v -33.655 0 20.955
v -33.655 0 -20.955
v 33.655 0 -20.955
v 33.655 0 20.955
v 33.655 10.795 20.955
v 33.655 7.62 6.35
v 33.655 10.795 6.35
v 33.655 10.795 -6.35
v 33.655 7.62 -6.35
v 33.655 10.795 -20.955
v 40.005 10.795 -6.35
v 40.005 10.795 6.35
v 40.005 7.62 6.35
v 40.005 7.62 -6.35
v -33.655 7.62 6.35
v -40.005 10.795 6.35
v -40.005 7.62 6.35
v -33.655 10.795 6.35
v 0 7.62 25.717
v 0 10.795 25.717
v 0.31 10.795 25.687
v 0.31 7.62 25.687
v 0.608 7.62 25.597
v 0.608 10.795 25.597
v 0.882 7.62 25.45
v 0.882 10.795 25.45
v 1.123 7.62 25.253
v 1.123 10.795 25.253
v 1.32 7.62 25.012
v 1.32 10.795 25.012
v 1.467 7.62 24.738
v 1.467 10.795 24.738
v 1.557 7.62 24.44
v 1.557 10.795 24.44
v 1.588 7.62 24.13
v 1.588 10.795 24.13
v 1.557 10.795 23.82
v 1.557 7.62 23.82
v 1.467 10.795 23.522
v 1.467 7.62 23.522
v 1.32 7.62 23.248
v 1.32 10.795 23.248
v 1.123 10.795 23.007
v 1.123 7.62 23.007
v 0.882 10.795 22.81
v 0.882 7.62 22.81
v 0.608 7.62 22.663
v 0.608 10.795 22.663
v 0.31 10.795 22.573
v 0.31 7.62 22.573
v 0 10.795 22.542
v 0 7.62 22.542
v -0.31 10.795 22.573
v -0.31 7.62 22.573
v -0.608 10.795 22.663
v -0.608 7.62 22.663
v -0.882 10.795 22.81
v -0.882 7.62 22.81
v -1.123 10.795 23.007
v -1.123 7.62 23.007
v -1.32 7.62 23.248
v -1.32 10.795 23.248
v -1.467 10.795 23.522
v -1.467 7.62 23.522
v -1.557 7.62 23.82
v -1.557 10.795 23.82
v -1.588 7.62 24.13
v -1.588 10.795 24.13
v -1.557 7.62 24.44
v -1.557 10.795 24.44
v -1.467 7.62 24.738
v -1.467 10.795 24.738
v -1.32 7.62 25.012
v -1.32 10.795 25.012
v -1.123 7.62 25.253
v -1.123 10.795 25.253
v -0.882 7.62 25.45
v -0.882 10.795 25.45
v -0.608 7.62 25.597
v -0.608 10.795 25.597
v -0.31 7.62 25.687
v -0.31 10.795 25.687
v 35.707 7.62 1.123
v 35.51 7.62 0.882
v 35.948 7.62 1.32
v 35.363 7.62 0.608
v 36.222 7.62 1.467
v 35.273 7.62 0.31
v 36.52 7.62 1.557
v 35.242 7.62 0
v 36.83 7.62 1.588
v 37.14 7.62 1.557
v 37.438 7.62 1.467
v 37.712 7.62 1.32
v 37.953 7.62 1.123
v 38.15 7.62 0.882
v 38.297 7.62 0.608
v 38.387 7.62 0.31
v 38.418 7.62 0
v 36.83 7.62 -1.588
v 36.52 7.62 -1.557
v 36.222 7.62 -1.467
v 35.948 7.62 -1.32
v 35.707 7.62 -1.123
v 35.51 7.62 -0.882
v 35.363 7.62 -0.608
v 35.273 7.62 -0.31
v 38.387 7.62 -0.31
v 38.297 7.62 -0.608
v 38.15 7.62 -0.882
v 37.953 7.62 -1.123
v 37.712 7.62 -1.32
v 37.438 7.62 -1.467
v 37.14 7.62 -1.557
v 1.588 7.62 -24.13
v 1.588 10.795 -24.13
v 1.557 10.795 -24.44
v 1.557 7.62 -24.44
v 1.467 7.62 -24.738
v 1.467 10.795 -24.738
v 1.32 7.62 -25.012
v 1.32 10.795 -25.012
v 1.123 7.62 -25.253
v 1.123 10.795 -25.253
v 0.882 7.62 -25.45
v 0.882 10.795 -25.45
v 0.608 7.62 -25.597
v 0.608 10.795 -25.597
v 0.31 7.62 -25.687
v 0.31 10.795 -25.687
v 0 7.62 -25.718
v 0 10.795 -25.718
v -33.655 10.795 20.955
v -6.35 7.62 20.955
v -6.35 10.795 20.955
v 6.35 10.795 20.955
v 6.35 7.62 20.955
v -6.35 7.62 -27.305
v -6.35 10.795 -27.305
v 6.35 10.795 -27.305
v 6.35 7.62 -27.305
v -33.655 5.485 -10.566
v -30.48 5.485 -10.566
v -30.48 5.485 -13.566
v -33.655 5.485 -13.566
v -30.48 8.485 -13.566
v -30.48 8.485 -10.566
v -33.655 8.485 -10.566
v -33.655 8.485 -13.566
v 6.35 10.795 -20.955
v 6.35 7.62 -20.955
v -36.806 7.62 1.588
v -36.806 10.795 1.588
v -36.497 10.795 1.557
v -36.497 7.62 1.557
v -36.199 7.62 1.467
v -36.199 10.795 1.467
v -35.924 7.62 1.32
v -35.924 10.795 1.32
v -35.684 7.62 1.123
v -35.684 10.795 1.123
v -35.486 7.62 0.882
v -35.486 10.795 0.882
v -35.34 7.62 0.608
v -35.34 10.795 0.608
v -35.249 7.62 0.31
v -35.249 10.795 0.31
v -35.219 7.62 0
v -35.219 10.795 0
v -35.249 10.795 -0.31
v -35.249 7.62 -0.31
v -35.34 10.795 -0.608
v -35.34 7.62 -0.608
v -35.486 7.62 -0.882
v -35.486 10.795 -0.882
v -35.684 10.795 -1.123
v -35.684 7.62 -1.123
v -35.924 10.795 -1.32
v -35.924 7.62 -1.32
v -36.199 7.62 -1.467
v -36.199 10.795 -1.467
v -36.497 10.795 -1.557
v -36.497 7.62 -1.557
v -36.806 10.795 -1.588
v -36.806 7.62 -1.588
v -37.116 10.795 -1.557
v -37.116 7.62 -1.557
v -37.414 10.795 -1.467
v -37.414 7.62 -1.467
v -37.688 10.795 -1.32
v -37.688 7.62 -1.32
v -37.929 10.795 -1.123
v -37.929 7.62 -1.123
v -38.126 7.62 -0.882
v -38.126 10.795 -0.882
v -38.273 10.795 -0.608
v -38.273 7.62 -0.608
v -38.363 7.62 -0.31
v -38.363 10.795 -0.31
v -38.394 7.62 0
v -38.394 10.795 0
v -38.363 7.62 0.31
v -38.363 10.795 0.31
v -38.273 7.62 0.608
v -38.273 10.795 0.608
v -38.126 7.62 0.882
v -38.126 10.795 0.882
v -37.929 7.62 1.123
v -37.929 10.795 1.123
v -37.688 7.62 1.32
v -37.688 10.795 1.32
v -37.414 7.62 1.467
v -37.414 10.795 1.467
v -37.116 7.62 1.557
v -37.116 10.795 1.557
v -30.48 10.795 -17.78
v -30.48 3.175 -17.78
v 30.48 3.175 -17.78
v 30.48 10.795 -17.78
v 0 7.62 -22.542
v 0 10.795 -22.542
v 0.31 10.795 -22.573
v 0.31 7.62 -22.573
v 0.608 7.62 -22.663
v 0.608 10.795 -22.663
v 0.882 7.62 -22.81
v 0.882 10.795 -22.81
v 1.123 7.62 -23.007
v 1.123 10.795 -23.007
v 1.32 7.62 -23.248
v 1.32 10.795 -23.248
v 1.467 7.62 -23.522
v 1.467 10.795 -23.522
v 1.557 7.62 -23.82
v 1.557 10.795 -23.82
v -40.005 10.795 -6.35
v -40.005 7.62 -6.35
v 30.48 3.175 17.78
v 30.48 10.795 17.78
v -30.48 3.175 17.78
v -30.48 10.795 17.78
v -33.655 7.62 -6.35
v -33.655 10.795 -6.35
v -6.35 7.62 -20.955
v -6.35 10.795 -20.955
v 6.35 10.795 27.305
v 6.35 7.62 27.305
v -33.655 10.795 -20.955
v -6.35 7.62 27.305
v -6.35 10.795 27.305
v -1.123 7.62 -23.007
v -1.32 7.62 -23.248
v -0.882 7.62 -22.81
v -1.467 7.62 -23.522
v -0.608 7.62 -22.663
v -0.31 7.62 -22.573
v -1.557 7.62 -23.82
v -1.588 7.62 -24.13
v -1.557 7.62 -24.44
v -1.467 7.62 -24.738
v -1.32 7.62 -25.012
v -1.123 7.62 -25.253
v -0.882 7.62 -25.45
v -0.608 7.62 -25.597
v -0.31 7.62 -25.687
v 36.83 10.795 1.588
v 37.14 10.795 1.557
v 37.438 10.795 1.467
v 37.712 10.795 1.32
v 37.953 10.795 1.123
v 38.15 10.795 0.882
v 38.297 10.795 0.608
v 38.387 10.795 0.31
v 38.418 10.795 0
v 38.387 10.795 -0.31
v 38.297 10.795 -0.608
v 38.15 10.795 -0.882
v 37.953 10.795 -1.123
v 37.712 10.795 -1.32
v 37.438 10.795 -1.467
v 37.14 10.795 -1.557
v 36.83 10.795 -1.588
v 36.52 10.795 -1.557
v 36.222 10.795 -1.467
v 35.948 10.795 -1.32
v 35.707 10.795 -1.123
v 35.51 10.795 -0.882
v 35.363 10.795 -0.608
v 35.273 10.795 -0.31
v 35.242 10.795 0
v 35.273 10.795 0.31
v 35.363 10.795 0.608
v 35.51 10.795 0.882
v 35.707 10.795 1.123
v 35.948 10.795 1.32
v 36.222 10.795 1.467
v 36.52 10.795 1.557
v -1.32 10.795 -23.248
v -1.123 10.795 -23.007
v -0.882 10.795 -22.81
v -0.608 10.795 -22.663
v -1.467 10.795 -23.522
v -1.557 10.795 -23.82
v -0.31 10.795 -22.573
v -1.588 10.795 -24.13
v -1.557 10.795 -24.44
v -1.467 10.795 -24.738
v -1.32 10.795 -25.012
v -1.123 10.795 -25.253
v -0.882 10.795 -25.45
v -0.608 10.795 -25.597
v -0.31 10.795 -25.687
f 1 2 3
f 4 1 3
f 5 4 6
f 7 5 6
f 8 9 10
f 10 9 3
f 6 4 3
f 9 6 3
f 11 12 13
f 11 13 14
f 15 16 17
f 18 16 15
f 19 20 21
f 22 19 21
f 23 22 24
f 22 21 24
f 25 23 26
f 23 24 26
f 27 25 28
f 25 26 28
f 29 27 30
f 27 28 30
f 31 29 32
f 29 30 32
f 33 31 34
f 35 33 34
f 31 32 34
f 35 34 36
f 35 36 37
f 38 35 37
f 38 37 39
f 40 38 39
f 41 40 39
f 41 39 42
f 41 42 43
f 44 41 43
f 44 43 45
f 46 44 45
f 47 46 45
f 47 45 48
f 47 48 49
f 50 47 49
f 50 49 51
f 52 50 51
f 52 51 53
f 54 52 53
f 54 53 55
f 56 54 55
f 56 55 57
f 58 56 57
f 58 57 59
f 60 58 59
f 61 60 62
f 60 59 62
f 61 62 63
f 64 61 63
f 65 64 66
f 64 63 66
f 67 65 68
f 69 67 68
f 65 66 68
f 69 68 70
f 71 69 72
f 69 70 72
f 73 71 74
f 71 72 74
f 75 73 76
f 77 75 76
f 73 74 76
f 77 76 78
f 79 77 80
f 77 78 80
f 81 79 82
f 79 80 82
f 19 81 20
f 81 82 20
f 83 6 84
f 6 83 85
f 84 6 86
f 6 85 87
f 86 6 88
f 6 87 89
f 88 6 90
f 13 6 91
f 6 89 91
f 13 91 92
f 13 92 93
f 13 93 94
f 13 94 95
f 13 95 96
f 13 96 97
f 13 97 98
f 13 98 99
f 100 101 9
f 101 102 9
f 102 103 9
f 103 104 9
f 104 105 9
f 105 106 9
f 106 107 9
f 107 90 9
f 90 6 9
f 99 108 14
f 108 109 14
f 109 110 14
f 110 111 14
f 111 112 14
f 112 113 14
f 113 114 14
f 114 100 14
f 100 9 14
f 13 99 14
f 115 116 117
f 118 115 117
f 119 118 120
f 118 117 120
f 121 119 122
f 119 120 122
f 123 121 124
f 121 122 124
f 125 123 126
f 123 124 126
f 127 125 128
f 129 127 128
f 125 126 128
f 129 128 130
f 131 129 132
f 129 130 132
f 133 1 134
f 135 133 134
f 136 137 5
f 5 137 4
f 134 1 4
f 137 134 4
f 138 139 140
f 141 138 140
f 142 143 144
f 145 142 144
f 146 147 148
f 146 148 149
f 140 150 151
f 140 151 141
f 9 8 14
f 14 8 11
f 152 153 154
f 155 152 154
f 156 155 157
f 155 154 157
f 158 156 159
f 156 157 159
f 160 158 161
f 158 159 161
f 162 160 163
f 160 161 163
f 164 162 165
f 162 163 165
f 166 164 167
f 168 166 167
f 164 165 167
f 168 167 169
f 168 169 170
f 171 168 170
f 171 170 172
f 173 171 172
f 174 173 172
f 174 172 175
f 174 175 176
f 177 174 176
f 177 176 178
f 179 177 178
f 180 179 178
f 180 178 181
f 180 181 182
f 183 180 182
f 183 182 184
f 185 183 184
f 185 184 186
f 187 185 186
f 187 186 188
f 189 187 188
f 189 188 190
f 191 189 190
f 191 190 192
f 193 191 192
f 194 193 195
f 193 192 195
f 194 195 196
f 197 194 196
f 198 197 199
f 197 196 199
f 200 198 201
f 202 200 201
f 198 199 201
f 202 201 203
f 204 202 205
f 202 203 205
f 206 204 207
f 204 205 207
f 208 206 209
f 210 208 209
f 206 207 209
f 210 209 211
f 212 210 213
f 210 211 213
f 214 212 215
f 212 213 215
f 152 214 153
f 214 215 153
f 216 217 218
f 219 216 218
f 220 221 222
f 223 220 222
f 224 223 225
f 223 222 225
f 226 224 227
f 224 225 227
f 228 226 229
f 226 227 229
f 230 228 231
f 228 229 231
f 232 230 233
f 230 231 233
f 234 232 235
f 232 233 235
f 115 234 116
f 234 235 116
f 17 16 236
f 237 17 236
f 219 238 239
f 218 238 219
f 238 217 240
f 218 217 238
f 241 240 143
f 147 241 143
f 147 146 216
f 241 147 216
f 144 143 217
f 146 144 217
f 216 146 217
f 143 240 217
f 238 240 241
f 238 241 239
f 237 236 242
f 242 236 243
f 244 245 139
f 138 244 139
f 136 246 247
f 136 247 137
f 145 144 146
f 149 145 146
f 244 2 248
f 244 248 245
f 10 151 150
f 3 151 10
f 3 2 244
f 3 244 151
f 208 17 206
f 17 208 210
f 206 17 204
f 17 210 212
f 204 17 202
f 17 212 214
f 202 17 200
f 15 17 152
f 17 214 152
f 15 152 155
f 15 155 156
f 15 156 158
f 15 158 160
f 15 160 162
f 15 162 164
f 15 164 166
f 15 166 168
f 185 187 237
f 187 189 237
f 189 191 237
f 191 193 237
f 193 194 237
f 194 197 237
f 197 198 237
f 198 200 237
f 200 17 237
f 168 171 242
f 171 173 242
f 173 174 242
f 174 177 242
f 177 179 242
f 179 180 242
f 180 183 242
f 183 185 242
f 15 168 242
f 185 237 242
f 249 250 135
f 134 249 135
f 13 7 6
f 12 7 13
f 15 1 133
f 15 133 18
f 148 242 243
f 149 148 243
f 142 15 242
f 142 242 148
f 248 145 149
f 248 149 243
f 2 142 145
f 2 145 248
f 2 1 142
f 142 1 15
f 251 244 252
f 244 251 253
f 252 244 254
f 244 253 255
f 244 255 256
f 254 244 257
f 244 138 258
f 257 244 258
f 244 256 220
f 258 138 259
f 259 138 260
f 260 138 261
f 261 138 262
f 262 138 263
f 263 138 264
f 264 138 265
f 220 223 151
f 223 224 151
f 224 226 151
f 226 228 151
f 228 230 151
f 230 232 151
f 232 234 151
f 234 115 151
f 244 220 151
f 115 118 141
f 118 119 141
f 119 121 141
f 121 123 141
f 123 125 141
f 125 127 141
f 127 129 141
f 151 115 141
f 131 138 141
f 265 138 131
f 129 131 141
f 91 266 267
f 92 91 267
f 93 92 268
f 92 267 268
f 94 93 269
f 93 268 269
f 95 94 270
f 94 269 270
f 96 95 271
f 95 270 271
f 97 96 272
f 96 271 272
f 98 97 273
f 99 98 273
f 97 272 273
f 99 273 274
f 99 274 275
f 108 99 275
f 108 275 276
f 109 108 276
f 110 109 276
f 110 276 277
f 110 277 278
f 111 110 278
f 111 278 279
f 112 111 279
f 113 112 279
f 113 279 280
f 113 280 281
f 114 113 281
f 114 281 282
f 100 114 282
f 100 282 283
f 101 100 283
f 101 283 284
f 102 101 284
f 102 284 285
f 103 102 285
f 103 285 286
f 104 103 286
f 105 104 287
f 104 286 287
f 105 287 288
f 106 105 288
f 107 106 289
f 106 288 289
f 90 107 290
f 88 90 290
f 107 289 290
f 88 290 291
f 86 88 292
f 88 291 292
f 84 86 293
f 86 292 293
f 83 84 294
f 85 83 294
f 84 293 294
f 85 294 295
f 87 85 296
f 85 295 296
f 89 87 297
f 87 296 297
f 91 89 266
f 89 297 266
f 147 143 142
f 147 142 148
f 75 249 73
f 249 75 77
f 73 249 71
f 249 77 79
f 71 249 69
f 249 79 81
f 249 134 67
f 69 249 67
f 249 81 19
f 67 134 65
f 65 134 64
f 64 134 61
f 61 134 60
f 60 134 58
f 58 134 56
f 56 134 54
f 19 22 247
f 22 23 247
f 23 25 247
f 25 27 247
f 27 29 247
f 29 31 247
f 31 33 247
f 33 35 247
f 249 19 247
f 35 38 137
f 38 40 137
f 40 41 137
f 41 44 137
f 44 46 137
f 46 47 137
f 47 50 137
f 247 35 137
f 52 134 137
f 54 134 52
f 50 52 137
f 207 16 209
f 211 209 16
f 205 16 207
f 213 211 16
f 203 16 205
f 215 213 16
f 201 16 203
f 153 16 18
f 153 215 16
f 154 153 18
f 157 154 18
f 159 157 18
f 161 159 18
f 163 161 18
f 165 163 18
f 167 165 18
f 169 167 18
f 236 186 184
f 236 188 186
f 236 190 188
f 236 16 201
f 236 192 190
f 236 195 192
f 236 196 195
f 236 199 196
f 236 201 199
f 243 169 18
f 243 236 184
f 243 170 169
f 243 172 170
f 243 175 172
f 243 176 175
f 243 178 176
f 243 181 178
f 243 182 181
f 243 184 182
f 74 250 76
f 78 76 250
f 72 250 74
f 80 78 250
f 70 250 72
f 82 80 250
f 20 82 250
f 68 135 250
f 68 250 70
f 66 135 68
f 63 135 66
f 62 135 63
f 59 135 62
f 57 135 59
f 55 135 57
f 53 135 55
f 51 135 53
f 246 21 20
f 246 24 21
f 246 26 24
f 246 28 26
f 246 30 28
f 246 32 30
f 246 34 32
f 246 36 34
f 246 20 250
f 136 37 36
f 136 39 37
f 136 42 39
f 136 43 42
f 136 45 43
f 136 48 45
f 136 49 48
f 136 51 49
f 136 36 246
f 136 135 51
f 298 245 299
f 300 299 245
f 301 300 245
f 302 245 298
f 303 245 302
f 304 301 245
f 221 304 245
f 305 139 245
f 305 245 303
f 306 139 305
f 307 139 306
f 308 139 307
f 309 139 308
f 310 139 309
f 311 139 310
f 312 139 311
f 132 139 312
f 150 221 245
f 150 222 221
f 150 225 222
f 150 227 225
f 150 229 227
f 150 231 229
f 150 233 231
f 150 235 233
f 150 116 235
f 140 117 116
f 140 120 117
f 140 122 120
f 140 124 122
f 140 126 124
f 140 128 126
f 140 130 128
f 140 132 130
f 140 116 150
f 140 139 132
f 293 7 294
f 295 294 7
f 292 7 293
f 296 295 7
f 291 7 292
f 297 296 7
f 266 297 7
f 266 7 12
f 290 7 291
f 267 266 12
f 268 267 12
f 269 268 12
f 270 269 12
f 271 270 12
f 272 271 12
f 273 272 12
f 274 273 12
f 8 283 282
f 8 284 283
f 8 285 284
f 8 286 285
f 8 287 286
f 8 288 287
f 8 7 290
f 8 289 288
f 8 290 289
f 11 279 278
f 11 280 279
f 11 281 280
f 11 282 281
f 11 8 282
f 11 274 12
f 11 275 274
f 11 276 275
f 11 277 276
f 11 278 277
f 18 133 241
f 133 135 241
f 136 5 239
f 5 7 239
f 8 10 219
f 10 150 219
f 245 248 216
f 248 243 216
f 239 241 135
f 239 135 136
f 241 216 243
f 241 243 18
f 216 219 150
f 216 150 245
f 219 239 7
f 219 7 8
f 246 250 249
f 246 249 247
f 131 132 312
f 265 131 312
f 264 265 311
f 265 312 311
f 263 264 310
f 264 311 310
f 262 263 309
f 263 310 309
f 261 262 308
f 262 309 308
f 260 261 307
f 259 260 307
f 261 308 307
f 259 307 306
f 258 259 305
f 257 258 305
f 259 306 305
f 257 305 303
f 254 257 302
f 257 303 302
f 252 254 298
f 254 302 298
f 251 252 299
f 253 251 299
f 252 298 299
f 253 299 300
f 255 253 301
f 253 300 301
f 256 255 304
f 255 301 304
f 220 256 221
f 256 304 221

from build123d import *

# Parameters (mm, degrees)
SKETCH1_W           = 67.31
SKETCH1_H           = 41.91
BOSS_EXTRUDE5_DEPTH = 3.175
SKETCH2_W           = 67.31
SKETCH2_H           = 41.91
SKETCH2_W_2         = 60.96
SKETCH2_H_2         = 35.56
BOSS_EXTRUDE6_DEPTH = 7.62
SKETCH4_W           = 12.7
SKETCH4_H           = 6.35
SKETCH4_W_2         = 6.35
SKETCH4_H_2         = 12.7
BOSS_EXTRUDE8_DEPTH = 3.175
SKETCH6_R           = 1.5875
CUT_EXTRUDE1_DEPTH  = 50.62353348
SKETCH7_W           = 3
SKETCH7_H           = 3
CUT_EXTRUDE2_DEPTH  = 77.355944595


with BuildPart() as part:
    # Sketch1 → Boss-Extrude5 (new body)
    with BuildSketch(Plane(origin=(0, 0, 0), x_dir=(1, 0, 0), z_dir=(0, 1, 0))):
        Rectangle(SKETCH1_W, SKETCH1_H)
    extrude(amount=BOSS_EXTRUDE5_DEPTH)

    # Sketch2 → Boss-Extrude6 (add)
    with BuildSketch(Plane(origin=(0, 3.175, 0), x_dir=(1, 0, 0), z_dir=(0, 1, 0))):
        Rectangle(SKETCH2_W, SKETCH2_H)
        Rectangle(SKETCH2_W_2, SKETCH2_H_2, mode=Mode.SUBTRACT)
    extrude(amount=BOSS_EXTRUDE6_DEPTH)

    # Sketch4 → Boss-Extrude8 (add)
    with BuildSketch(Plane(origin=(0, 10.795, 0), x_dir=(1, 0, 0), z_dir=(0, 1, 0))):
        with Locations((0, -24.13)):
            Rectangle(SKETCH4_W, SKETCH4_H)
        with Locations((0, 24.13)):
            Rectangle(SKETCH4_W, SKETCH4_H)
        with Locations((36.83, 0)):
            Rectangle(SKETCH4_W_2, SKETCH4_H_2)
        with Locations((-36.83, 0)):
            Rectangle(SKETCH4_W_2, SKETCH4_H_2)
    extrude(amount=-BOSS_EXTRUDE8_DEPTH)

    # Sketch6 → Cut-Extrude1 (cut, through all)
    with BuildSketch(Plane(origin=(0, 10.795, 0), x_dir=(1, 0, 0), z_dir=(0, 1, 0))):
        with BuildLine():
            ThreePointArc((0, 25.7175), (-1.5875, 24.13), (0, 22.5425))
            Line((0, 22.5425), (0, 25.7175))
        make_face()
        with BuildLine():
            Line((0, 25.7175), (0, 22.5425))
            ThreePointArc((0, 22.5425), (1.122532015, 23.007467985), (1.5875, 24.13))
            ThreePointArc((1.5875, 24.13), (1.122532015, 25.252532015), (0, 25.7175))
        make_face()
        with Locations(Location((-36.806414665, 0, 0), (0, 0, 270))):
            Circle(SKETCH6_R)
        with Locations(Location((36.83, 0, 0), (0, 0, 270))):
            Circle(SKETCH6_R)
        with Locations(Location((0, -24.13, 0), (0, 0, 270))):
            Circle(SKETCH6_R)
    extrude(amount=-CUT_EXTRUDE1_DEPTH, mode=Mode.SUBTRACT)

    # Sketch7 → Cut-Extrude2 (cut, through all)
    with BuildSketch(Plane(origin=(-30.48, 0, 0), x_dir=(0, 0, -1), z_dir=(1, 0, 0))):
        with Locations((12.065620766, 6.985)):
            Rectangle(SKETCH7_W, SKETCH7_H)
    extrude(amount=-CUT_EXTRUDE2_DEPTH, mode=Mode.SUBTRACT)


solid = part.part
